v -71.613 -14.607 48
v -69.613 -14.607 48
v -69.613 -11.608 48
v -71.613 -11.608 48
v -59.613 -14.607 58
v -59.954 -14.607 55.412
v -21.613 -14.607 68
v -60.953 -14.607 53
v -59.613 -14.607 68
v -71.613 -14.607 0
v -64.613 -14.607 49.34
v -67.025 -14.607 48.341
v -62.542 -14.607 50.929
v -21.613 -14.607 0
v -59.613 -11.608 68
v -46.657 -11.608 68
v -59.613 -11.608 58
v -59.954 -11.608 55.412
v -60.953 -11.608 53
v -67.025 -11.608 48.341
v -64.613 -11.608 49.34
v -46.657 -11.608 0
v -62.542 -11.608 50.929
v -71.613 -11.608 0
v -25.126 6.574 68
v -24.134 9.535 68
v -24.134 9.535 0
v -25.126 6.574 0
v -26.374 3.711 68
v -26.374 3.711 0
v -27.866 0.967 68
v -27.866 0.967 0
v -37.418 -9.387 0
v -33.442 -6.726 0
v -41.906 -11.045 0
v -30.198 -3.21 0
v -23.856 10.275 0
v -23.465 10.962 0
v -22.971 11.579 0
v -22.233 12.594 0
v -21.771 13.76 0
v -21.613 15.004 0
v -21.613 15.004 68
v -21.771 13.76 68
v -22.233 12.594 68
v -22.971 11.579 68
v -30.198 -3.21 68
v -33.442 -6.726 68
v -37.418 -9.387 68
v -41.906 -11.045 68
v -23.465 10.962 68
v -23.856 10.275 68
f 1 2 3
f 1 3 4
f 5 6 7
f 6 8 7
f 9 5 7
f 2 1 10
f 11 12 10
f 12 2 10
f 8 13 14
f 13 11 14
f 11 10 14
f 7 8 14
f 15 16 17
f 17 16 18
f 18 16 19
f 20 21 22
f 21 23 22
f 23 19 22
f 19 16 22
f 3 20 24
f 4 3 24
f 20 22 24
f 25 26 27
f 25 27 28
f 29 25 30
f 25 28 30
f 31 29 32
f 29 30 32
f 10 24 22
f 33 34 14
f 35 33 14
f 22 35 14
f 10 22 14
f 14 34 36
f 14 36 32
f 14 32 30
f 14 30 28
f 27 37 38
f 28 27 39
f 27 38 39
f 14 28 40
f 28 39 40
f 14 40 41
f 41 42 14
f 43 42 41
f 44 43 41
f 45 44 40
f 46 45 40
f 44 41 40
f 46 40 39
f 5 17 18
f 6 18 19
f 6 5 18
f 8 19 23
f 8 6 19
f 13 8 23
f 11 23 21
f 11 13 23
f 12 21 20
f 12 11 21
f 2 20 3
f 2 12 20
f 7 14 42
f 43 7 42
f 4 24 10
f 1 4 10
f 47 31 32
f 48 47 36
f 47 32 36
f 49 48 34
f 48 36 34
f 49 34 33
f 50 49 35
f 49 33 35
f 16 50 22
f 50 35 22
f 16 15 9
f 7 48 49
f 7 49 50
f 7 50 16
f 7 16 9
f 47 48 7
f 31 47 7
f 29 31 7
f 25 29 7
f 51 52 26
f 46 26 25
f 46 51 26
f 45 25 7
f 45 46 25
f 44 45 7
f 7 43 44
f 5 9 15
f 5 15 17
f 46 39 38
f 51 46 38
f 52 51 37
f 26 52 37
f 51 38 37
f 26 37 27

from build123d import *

# Parameters (mm, degrees)
BOSS_EXTRUDE1_DEPTH = 68
CUT_EXTRUDE1_DEPTH  = 10


with BuildPart() as part:
    # Sketch2 → Boss-Extrude1 (new body)
    with BuildSketch(Plane.XY):
        with BuildLine():
            Line((-46.657067634, -11.60759921), (-71.613281954, -11.60759921))
            Line((-71.613281954, -11.60759921), (-71.613281954, -14.607279662))
            Line((-71.613281954, -14.607279662), (-21.613281954, -14.607279662))
            Line((-21.613281954, -14.607279662), (-21.613281954, 15.004436623))
            ThreePointArc((-21.613281954, 15.004436623), (-21.964992236, 13.162317544), (-22.970643034, 11.579355354))
            ThreePointArc((-22.970643034, 11.579355354), (-23.673981627, 10.626616994), (-24.133529038, 9.535190525))
            ThreePointArc((-24.133529038, 9.535190525), (-25.71874065, 5.128724796), (-27.866056136, 0.967129876))
            ThreePointArc((-27.866056136, 0.967129876), (-35.351914775, -8.173910524), (-46.657067634, -11.60759921))
        make_face()
    extrude(amount=BOSS_EXTRUDE1_DEPTH)

    # Sketch3 → Cut-Extrude1 (cut)
    with BuildSketch(Plane(origin=(0, -14.607279662, 0), x_dir=(-1, 0, 0), z_dir=(0, -1, 0))):
        with BuildLine():
            Line((71.613281954, -68), (59.613281954, -68))
            Line((59.613281954, -68), (59.613281954, -58))
            ThreePointArc((59.613281954, -58), (62.542214142, -50.928932188), (69.613281954, -48))
            Line((69.613281954, -48), (71.613281954, -48))
            Line((71.613281954, -48), (71.613281954, -68))
        make_face()
    extrude(amount=-CUT_EXTRUDE1_DEPTH, mode=Mode.SUBTRACT)


solid = part.part
